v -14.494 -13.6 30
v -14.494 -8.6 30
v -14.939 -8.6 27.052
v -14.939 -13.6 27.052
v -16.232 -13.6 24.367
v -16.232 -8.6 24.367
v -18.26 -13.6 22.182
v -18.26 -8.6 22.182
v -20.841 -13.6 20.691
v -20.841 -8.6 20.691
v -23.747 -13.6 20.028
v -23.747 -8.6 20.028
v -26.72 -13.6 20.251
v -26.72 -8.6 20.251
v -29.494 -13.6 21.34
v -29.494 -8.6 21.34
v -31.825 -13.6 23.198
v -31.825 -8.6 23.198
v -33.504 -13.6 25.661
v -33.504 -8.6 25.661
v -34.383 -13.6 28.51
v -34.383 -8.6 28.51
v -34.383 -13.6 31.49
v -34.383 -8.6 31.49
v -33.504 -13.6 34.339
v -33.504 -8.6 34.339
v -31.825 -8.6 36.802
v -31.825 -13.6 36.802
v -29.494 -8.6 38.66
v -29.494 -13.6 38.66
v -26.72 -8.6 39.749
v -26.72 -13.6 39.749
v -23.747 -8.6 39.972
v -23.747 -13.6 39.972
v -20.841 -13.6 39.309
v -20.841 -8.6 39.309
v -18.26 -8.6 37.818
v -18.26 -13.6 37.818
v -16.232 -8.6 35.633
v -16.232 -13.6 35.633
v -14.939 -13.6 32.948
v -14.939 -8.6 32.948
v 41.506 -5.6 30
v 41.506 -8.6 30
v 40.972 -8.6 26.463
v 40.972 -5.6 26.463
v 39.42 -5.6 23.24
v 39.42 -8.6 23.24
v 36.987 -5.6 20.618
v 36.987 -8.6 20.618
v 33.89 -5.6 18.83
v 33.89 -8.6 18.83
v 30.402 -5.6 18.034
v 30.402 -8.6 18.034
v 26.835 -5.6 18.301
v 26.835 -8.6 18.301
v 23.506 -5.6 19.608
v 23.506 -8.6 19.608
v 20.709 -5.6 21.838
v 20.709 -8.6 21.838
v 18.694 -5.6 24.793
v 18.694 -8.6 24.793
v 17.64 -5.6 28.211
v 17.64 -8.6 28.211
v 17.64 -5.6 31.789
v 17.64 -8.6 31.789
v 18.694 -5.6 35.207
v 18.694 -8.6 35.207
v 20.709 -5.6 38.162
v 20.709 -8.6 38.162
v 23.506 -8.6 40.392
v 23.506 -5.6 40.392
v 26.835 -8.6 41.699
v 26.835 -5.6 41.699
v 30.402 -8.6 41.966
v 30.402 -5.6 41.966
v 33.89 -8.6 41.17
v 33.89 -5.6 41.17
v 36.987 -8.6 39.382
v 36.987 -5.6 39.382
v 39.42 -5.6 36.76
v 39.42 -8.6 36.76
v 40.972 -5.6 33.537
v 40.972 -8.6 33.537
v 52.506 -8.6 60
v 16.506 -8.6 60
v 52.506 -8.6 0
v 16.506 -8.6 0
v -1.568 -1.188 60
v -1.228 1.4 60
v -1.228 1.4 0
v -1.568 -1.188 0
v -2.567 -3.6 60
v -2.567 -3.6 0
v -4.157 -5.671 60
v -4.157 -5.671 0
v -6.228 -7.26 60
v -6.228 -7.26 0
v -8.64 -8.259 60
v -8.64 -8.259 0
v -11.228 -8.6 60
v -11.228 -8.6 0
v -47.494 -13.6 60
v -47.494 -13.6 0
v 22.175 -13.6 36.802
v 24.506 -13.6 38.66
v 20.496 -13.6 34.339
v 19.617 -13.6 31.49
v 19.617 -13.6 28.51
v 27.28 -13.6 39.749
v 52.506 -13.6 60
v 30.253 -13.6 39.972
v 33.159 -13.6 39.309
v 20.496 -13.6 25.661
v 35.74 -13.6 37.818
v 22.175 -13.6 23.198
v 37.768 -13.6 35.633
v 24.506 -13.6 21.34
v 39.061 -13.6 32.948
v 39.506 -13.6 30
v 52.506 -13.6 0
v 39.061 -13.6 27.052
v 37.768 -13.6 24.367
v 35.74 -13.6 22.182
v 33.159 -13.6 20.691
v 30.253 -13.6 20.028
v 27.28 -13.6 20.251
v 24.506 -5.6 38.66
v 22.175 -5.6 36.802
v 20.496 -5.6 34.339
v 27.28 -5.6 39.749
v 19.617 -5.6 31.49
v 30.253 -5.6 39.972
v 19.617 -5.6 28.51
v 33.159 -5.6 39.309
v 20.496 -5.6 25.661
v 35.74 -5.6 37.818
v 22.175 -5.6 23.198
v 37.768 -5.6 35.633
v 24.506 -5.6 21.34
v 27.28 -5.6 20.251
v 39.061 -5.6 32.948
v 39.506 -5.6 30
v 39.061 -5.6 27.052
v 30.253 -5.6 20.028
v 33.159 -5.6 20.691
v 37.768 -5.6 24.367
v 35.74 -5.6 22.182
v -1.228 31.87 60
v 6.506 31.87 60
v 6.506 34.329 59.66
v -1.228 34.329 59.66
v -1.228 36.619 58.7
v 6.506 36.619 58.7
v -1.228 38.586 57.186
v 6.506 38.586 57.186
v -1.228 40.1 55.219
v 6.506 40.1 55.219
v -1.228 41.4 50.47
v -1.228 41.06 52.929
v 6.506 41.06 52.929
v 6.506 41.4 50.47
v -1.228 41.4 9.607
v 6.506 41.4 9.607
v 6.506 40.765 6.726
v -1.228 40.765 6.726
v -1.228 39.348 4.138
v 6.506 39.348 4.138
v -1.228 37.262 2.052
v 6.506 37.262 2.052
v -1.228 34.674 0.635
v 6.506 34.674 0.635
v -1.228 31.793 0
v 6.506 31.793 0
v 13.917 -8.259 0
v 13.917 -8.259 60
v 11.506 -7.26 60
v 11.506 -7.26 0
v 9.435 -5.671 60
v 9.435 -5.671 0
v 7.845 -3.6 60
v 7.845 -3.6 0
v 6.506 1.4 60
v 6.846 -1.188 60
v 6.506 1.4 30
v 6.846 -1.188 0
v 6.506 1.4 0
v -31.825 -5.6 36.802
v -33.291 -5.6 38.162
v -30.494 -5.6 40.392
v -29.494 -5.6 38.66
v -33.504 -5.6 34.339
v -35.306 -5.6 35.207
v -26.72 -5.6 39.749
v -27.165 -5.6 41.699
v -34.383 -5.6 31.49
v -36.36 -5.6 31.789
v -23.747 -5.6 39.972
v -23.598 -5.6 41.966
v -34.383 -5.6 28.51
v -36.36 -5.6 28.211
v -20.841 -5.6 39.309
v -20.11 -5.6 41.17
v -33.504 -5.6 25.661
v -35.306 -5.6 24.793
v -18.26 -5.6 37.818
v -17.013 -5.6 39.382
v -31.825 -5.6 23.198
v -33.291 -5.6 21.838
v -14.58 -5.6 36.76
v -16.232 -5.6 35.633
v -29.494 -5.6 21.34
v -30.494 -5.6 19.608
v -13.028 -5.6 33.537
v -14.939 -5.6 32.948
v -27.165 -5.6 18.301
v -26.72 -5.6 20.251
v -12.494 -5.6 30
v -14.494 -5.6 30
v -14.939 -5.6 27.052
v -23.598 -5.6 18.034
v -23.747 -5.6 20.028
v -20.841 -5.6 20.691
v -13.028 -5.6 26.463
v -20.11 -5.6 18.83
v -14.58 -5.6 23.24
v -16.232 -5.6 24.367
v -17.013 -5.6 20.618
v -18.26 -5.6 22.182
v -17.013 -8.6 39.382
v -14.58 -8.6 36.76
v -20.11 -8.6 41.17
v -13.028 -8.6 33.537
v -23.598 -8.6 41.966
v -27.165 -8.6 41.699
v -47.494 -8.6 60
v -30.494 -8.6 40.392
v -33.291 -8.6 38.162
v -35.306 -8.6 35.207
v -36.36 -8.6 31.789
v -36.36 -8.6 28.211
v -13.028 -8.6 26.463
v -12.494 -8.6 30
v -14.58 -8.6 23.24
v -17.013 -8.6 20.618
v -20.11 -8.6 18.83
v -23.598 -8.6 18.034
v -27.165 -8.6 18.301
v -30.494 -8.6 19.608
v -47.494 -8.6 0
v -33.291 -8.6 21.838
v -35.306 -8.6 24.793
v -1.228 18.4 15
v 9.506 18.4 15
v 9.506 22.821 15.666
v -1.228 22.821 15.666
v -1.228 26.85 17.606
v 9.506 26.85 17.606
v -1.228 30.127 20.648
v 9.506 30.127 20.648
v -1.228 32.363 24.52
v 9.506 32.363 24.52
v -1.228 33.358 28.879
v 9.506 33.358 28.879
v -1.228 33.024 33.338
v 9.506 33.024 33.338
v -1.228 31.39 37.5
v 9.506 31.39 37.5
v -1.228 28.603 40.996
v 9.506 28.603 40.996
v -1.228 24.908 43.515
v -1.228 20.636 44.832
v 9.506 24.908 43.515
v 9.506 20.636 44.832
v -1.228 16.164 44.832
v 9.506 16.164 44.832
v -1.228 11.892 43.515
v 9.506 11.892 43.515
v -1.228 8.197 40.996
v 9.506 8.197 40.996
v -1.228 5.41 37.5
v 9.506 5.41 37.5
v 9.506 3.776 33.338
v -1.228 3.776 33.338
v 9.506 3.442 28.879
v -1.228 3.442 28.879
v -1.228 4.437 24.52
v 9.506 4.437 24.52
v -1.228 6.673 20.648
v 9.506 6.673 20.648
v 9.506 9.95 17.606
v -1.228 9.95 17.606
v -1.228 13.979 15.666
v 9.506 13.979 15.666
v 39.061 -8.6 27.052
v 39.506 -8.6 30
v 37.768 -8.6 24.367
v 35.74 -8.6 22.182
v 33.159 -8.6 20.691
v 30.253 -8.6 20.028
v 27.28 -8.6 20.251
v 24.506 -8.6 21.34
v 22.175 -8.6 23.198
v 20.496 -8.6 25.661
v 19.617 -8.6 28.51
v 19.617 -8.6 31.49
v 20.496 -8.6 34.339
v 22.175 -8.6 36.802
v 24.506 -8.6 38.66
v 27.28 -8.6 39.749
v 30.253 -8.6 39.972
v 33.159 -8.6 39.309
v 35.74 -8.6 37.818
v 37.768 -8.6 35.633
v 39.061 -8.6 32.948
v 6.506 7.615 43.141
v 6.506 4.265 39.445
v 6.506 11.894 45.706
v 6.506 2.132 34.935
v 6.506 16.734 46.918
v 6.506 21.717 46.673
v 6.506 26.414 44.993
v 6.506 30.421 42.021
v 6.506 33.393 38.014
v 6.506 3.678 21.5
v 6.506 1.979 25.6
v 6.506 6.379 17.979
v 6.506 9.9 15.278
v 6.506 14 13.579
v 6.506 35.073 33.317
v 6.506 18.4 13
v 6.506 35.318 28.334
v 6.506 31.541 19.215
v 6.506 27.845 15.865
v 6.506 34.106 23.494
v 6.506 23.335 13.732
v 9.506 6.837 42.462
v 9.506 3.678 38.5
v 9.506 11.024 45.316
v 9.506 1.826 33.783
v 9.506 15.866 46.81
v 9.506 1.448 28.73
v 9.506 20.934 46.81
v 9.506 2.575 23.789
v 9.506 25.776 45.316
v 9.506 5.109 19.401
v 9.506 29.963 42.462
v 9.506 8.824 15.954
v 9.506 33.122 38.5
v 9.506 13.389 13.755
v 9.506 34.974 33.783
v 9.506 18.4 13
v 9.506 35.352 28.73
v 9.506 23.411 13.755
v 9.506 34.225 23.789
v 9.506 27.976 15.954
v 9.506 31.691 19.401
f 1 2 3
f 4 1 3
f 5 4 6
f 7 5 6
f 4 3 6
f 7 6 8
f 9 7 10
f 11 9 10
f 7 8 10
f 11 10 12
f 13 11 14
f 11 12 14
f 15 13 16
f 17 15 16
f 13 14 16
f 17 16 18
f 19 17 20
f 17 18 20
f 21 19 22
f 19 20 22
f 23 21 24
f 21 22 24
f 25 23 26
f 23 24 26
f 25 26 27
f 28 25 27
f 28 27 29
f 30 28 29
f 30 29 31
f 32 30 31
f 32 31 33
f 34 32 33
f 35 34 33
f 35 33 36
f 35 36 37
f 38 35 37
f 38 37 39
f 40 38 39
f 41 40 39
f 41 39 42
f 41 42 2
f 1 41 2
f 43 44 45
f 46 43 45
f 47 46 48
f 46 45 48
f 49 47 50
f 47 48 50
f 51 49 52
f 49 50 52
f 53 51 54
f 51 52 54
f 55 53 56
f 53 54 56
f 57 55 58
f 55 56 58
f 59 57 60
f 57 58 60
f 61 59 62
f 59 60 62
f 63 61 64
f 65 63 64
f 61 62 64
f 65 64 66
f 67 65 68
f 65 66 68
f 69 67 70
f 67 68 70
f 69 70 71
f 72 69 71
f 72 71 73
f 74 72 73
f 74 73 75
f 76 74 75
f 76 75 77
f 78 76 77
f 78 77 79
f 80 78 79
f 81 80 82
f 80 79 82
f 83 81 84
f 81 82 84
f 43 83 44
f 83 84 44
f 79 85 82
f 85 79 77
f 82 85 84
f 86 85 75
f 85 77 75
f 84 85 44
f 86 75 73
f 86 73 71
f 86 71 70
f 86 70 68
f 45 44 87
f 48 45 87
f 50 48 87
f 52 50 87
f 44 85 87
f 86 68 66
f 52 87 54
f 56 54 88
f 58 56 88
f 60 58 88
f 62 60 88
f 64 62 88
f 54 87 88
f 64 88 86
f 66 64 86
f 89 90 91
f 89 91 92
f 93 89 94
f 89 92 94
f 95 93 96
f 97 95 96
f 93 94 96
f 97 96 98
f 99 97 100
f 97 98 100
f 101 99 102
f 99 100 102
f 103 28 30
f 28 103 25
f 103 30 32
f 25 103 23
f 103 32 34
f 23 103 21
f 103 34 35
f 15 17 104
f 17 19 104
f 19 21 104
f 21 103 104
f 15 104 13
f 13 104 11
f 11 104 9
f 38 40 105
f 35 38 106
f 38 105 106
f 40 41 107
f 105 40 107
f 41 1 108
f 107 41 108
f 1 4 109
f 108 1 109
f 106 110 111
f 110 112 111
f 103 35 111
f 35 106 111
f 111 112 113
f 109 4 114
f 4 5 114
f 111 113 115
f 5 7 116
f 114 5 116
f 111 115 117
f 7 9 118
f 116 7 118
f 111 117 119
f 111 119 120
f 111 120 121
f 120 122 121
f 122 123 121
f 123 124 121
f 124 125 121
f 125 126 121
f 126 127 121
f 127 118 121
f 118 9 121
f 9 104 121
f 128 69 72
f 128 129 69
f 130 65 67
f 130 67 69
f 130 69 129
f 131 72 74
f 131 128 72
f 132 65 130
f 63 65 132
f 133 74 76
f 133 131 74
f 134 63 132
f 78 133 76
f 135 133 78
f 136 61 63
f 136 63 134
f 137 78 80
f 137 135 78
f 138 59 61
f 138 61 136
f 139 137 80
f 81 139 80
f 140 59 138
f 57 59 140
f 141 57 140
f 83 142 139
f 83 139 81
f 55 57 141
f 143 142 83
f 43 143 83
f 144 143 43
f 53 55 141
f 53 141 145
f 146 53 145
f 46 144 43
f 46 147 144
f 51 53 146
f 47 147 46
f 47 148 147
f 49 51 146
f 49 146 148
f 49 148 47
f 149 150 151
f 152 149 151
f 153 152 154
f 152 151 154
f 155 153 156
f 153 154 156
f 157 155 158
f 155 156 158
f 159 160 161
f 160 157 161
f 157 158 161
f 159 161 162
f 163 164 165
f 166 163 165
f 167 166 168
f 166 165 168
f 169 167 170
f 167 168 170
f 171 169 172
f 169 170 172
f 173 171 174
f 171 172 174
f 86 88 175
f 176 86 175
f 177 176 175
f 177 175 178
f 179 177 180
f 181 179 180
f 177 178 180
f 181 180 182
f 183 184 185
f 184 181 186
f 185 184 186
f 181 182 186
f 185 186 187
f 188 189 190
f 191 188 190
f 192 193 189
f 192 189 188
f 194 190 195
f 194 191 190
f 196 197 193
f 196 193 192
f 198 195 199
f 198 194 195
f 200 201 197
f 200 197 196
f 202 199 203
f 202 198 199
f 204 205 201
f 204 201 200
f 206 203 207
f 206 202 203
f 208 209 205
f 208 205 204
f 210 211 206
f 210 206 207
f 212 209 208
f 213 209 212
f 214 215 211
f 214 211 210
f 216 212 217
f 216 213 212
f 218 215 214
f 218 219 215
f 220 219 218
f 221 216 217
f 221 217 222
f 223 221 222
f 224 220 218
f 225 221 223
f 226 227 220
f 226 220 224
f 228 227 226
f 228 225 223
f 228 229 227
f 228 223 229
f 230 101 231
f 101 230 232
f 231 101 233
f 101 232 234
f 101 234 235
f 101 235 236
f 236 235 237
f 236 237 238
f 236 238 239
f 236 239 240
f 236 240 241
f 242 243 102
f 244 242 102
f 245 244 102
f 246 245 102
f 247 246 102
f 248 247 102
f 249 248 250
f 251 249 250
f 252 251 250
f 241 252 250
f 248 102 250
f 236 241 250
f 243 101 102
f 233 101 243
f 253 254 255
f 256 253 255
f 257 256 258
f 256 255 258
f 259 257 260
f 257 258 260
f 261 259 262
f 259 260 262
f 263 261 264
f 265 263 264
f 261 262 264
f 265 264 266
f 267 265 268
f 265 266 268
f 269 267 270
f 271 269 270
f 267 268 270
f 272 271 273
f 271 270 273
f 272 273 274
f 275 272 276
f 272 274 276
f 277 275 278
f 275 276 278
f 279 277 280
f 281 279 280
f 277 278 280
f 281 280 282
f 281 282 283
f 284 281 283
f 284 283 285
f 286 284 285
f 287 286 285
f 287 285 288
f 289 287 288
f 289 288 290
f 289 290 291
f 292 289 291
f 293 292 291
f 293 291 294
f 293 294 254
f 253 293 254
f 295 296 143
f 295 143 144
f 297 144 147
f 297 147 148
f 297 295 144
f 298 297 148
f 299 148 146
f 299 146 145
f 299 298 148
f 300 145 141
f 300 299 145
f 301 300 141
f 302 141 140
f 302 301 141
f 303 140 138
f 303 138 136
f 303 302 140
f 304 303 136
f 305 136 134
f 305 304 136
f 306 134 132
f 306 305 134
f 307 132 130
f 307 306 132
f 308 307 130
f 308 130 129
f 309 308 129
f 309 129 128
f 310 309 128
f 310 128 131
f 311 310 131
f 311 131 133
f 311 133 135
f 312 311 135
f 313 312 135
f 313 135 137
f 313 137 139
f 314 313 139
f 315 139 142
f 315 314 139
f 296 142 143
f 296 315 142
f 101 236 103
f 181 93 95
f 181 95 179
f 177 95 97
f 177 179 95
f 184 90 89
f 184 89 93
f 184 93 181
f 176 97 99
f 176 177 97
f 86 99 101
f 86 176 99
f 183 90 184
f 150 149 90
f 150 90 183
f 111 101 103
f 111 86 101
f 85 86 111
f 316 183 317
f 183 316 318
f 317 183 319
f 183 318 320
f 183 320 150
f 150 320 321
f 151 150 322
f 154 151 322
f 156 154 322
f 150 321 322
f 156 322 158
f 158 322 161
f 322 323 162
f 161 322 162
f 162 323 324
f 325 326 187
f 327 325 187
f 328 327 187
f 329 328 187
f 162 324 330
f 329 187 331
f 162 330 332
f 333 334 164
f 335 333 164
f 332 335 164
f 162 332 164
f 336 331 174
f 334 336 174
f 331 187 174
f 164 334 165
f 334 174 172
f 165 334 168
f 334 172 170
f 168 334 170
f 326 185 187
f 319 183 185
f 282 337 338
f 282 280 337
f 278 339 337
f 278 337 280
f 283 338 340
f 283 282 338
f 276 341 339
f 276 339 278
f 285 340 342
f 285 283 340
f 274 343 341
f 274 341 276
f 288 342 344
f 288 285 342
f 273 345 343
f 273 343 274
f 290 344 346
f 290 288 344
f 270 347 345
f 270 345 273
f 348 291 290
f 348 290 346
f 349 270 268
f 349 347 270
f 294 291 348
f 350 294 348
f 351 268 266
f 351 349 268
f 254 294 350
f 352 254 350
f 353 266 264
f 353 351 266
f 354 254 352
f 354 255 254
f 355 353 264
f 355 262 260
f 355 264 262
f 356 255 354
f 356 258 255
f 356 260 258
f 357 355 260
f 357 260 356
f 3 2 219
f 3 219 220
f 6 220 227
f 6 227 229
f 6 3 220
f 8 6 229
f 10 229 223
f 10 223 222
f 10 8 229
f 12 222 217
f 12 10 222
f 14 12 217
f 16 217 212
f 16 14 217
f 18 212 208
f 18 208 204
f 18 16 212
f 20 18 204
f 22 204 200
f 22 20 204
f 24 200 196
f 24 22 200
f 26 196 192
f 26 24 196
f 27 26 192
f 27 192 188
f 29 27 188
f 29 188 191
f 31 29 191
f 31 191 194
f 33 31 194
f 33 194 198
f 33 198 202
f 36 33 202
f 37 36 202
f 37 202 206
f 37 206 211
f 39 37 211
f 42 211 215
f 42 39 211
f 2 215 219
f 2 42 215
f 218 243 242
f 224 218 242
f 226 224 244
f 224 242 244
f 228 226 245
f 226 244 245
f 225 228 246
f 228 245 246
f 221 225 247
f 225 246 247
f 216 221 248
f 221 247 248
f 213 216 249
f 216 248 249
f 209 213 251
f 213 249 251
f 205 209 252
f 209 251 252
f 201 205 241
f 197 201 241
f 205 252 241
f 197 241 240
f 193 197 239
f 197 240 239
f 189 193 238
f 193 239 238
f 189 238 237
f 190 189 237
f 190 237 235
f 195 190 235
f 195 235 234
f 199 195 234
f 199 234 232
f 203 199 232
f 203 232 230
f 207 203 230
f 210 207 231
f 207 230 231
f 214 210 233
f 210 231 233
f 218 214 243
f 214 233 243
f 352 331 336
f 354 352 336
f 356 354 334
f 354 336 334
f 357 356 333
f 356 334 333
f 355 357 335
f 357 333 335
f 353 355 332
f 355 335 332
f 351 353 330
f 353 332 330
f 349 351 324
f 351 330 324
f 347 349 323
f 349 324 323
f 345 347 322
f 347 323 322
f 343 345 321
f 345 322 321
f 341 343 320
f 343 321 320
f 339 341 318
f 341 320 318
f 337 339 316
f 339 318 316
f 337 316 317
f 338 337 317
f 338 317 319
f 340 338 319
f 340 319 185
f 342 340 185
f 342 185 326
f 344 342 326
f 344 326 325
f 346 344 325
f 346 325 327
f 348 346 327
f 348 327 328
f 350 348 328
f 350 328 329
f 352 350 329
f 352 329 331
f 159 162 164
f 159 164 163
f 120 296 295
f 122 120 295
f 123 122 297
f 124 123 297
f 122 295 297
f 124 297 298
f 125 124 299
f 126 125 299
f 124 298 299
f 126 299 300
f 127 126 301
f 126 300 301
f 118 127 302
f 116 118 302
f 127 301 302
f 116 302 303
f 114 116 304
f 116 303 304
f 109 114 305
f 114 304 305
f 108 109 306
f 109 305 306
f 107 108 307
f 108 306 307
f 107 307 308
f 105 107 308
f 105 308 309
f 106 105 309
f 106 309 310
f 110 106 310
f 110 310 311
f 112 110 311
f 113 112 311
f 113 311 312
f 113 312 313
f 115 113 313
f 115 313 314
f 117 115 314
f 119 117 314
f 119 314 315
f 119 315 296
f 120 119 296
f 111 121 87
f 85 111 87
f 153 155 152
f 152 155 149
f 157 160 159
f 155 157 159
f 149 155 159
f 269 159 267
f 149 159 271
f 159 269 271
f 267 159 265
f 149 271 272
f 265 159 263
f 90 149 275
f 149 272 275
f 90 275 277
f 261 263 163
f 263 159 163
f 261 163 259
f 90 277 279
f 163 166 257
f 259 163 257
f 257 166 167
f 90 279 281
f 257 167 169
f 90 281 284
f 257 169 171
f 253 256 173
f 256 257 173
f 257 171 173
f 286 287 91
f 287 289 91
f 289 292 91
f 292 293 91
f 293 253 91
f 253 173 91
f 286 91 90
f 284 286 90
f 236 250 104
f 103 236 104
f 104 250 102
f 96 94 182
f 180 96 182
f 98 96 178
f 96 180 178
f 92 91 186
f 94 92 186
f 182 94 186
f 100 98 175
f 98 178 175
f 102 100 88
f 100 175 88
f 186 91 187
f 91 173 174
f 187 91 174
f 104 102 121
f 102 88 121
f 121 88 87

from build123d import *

# Parameters (mm, degrees)
BOSS_EXTRUDE1_DEPTH      = 60
SKETCH2_R                = 12
SKETCH2_R_2              = 10
BOSS_EXTRUDE3_DEPTH      = 3
CUT_EXTRUDE3_START       = -53
SKETCH10_R               = 10
CUT_EXTRUDE3_DEPTH       = 53
SKETCH11_5_R             = 15
CUT_EXTRUDE4_DEPTH       = 23
BOSS_EXTRUDE7_DEPTH      = 3
BOSS_EXTRUDE7_DEPTH_BACK = 3
SKETCH11_R               = 17
SKETCH11_R_2             = 15


with BuildPart() as part:
    # Sketch1 → Boss-Extrude1 (new body)
    with BuildSketch(Plane.XY):
        with BuildLine():
            Line((-47.49441662, -13.6), (52.50558338, -13.6))
            Line((52.50558338, -13.6), (52.50558338, -8.6))
            Line((52.50558338, -8.6), (16.50558338, -8.6))
            ThreePointArc((16.50558338, -8.6), (9.434515568, -5.671067812), (6.50558338, 1.4))
            Line((6.50558338, 1.4), (6.50558338, 41.4))
            Line((6.50558338, 41.4), (-1.227749954, 41.4))
            Line((-1.227749954, 41.4), (-1.227749954, 1.4))
            ThreePointArc((-1.227749954, 1.4), (-4.156682142, -5.671067812), (-11.227749954, -8.6))
            Line((-11.227749954, -8.6), (-47.49441662, -8.6))
            Line((-47.49441662, -8.6), (-47.49441662, -13.6))
        make_face()
    extrude(amount=BOSS_EXTRUDE1_DEPTH)

    # Sketch2 → Boss-Extrude3 (add)
    # profile 1 of 2: a face of its own
    with BuildSketch(Plane(origin=(0, -8.6, 0), x_dir=(1, 0, 0), z_dir=(0, 1, 0))):
        with Locations((-24.49441662, -30)):
            Circle(SKETCH2_R)
        with Locations((-24.49441662, -30)):
            Circle(SKETCH2_R_2, mode=Mode.SUBTRACT)
    # profile 2 of 2: a face of its own
    with BuildSketch(Plane(origin=(0, -8.6, 0), x_dir=(1, 0, 0), z_dir=(0, 1, 0))):
        with Locations((29.50558338, -30)):
            Circle(SKETCH2_R)
        with Locations((29.50558338, -30)):
            Circle(SKETCH2_R_2, mode=Mode.SUBTRACT)
    extrude(amount=BOSS_EXTRUDE3_DEPTH)

    # Sketch10 → Cut-Extrude3 (cut)
    with BuildSketch(Plane(origin=(0, -8.6, 0), x_dir=(1, 0, 0), z_dir=(0, 1, 0)).offset(CUT_EXTRUDE3_START)):
        with Locations((-24.49441662, -30)):
            Circle(SKETCH10_R)
        with Locations((29.50558338, -30)):
            Circle(SKETCH10_R)
    extrude(amount=CUT_EXTRUDE3_DEPTH, mode=Mode.SUBTRACT)

    # Sketch11<5> → Cut-Extrude4 (cut)
    with BuildSketch(Plane(origin=(6.50558338, 0, 0), x_dir=(0, 0, -1), z_dir=(1, 0, 0))):
        with Locations((-30, 18.4)):
            Circle(SKETCH11_5_R)
        with BuildLine():
            Line((0, 41.4), (-9.606995457, 41.4))
            ThreePointArc((-9.606995457, 41.4), (-3.020943995, 38.379056005), (0, 31.793004543))
            Line((0, 31.793004543), (0, 41.4))
        make_face()
        with BuildLine():
            Line((-60, 41.4), (-60, 31.869694824))
            ThreePointArc((-60, 31.869694824), (-57.186392619, 38.586392619), (-50.469694824, 41.4))
            Line((-50.469694824, 41.4), (-60, 41.4))
        make_face()
    extrude(amount=-CUT_EXTRUDE4_DEPTH, mode=Mode.SUBTRACT)

    # Sketch11 → Boss-Extrude7 (add, two sides: drawn at the far end of the back side and taken through both)
    with BuildSketch(Plane(origin=(6.50558338, 0, 0), x_dir=(0, 0, -1), z_dir=(1, 0, 0)).offset(-BOSS_EXTRUDE7_DEPTH_BACK)):
        with Locations((-30, 18.4)):
            Circle(SKETCH11_R)
        with Locations((-30, 18.4)):
            Circle(SKETCH11_R_2, mode=Mode.SUBTRACT)
    extrude(amount=BOSS_EXTRUDE7_DEPTH + BOSS_EXTRUDE7_DEPTH_BACK)


solid = part.part
